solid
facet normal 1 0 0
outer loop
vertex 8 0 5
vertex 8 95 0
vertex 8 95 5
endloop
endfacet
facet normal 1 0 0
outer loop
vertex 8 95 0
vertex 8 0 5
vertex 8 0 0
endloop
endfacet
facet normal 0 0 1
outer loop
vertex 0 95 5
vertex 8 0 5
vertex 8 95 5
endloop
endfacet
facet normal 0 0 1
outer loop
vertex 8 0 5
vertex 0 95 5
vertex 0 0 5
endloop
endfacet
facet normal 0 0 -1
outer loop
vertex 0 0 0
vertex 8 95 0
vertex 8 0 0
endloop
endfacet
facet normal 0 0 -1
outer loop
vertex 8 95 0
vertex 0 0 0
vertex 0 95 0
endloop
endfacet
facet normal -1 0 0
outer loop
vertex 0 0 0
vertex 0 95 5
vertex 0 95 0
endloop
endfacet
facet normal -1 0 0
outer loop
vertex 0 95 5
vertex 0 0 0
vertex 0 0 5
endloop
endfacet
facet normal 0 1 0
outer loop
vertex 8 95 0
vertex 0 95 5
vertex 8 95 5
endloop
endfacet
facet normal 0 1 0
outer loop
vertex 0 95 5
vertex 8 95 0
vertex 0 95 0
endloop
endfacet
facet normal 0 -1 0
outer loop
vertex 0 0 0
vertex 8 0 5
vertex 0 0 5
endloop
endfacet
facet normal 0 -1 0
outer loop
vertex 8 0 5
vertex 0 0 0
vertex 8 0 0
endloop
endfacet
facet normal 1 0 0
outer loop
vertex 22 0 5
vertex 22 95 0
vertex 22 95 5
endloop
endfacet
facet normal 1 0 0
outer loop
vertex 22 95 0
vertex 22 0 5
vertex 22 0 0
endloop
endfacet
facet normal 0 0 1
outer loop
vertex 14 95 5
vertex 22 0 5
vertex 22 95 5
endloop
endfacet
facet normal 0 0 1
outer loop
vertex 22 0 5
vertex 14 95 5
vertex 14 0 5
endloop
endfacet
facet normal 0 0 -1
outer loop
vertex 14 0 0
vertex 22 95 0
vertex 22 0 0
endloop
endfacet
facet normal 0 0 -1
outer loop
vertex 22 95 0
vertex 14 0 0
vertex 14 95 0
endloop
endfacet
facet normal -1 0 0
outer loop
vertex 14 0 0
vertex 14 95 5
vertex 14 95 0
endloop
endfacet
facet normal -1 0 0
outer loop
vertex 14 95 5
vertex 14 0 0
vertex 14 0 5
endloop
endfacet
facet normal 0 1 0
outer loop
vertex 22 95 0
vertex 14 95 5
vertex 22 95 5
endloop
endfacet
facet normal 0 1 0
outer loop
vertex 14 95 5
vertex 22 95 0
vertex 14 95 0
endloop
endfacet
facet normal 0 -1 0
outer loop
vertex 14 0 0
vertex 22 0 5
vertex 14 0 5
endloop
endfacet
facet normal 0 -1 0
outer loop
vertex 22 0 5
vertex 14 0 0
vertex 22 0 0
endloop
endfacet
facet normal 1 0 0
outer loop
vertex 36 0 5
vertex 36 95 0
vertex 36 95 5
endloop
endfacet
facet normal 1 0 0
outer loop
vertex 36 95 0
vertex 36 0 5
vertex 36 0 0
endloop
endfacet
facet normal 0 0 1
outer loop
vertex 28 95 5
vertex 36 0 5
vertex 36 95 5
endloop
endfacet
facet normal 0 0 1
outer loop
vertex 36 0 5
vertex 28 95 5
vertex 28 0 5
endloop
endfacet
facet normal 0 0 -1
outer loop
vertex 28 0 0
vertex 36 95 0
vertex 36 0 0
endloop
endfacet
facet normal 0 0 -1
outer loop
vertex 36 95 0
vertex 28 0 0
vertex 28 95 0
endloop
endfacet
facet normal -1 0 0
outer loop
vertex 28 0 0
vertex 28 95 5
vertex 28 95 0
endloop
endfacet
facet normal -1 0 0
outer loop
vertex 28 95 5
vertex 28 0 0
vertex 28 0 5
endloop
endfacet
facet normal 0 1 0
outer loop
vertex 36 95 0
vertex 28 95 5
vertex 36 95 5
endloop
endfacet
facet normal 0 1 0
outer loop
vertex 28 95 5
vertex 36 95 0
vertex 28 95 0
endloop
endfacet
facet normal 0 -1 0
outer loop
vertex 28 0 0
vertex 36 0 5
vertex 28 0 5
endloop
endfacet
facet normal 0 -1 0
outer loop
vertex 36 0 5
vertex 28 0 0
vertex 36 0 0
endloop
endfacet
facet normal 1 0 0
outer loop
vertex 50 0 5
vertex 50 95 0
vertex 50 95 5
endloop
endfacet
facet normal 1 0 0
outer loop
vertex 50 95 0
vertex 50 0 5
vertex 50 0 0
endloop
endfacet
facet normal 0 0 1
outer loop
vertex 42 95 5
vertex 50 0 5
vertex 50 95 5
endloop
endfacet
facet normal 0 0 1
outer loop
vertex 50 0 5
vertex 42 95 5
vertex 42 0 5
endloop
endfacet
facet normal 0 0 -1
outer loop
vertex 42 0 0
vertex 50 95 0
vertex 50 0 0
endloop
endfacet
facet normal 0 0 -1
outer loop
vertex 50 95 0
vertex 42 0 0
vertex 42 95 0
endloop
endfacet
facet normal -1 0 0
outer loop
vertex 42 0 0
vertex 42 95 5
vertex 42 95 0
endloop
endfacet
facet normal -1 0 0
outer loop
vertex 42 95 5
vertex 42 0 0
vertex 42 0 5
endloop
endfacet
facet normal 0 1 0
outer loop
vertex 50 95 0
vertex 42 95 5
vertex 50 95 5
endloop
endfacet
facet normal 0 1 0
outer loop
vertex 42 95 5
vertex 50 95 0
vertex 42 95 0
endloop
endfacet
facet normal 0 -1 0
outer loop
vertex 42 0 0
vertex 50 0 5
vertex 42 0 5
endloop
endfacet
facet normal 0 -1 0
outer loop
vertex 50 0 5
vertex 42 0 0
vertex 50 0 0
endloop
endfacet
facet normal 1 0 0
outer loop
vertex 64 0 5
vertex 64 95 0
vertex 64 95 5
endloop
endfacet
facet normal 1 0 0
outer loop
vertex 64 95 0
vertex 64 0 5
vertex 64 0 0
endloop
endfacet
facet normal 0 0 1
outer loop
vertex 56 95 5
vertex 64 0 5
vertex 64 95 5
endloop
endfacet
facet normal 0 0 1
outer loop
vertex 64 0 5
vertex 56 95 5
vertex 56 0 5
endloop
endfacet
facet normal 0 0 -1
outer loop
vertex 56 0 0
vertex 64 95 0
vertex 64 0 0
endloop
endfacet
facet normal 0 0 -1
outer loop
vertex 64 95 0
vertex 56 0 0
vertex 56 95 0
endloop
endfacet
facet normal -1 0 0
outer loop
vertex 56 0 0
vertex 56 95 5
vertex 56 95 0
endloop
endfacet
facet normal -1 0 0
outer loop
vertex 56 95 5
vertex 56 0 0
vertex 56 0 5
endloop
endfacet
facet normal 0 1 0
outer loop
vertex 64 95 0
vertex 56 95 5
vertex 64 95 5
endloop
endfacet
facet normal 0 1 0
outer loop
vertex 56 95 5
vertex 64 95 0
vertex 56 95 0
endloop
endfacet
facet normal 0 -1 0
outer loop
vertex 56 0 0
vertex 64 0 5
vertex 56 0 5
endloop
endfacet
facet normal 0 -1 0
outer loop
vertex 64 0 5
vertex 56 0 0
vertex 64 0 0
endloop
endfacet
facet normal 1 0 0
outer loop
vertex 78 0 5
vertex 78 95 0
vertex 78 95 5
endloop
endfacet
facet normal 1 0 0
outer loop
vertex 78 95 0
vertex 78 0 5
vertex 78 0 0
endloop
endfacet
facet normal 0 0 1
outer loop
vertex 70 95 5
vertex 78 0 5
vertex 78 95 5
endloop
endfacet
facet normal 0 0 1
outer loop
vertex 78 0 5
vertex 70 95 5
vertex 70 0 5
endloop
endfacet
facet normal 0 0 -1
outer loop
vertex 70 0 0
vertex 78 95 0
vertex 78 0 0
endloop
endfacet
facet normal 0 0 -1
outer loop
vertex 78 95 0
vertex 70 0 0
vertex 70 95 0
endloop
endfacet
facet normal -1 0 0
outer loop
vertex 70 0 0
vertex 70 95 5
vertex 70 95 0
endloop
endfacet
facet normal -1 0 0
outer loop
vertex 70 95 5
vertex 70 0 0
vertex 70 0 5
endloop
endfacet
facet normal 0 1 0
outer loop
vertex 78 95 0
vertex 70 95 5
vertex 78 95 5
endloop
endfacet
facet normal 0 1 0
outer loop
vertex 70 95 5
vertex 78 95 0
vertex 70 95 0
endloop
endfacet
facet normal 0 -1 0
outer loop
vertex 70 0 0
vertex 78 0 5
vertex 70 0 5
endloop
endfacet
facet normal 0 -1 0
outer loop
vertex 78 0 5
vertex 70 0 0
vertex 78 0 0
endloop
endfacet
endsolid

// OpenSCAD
// file: shapes.scad
// Shapes the fit test and the real parts share, so the parts get what the
// test print measured.
include <params.scad>

// Centered on x = 0. The outer face is y = 0 and the pocket opens through it;
// the stop runs from y = pocket to pocket + stop, with the wire slit through
// it. Open at the top.
module slot_void(width) {
    translate([-width / 2, -1, comb_base])
        cube([width, pocket + 1, comb_height - comb_base + 1]);
    translate([-wire_slit / 2, pocket - 1, comb_base])
        cube([wire_slit, stop + 2, comb_height - comb_base + 1]);
}

module label_text(t, size = 3) {
    linear_extrude(label_depth + 0.01)
        text(t, size = size, font = label_font,
             halign = "center", valign = "center");
}

module pin() {
    chamfer = 0.4;
    cylinder(d = stack_pin, h = stack_pin_height - chamfer, $fn = 64);
    translate([0, 0, stack_pin_height - chamfer])
        cylinder(d1 = stack_pin, d2 = stack_pin - 2 * chamfer, h = chamfer, $fn = 64);
}

// gap is a wire's measured gap between housings. Seated in both sockets, the
// rail puts the stops' pocket faces gap - gap_slack apart.
function rail_length(gap) = gap - gap_slack - 2 * stop + 2 * rail_socket_depth;

module rail(gap) {
    cube([rail_width, rail_length(gap), rail_height]);
}
// file: params.scad
// Every part includes this file. All lengths in mm, clearances per side.

// A 40-pin ribbon is 4 runs of 10 colors; a slot stacks 8, room for two kits.
housing = 2.54;
wires_per_slot = 8;
colors = 10;

// Fit test: the narrowest slot held flat, a stub took the 0.15 rail socket,
// the pin the 0.3 stack socket, and 3 mm digits read better than 2.5.
slot_width = 2.7;
rail_clearance = 0.15;
stack_clearance = 0.3;
digit_size = 3;

// Between a new wire's housings: 7 1/4 in measured on a 20 cm, 10 cm a guess.
wire_gap_10 = 84;
wire_gap_20 = 184;
// Bent wires come up short; a new one's housings sit out of their pockets.
gap_slack = 5;

slot_wall = 1.6;
// Clears 24 AWG insulation and stops a housing.
wire_slit = 1.9;
// Housings are 14 long, so male pins stick out past the outer face.
pocket = 12;
stop = 2;
comb_base = 2;
ledge = 7;
socket_wall = 2;
stack_height = wires_per_slot * housing + 0.3;
comb_height = comb_base + stack_height;

rail_width = 8;
rail_height = 5;
rail_socket_depth = 10;

stack_pin = 4;
stack_pin_height = 3;

label_depth = 0.6;
label_font = "Liberation Sans:style=Bold";
// main file
// All six 10 cm rails, two per tray.
include <params.scad>
use <shapes.scad>

for (i = [0 : 5])
    translate([i * (rail_width + 6), 0, 0]) rail(wire_gap_10);
